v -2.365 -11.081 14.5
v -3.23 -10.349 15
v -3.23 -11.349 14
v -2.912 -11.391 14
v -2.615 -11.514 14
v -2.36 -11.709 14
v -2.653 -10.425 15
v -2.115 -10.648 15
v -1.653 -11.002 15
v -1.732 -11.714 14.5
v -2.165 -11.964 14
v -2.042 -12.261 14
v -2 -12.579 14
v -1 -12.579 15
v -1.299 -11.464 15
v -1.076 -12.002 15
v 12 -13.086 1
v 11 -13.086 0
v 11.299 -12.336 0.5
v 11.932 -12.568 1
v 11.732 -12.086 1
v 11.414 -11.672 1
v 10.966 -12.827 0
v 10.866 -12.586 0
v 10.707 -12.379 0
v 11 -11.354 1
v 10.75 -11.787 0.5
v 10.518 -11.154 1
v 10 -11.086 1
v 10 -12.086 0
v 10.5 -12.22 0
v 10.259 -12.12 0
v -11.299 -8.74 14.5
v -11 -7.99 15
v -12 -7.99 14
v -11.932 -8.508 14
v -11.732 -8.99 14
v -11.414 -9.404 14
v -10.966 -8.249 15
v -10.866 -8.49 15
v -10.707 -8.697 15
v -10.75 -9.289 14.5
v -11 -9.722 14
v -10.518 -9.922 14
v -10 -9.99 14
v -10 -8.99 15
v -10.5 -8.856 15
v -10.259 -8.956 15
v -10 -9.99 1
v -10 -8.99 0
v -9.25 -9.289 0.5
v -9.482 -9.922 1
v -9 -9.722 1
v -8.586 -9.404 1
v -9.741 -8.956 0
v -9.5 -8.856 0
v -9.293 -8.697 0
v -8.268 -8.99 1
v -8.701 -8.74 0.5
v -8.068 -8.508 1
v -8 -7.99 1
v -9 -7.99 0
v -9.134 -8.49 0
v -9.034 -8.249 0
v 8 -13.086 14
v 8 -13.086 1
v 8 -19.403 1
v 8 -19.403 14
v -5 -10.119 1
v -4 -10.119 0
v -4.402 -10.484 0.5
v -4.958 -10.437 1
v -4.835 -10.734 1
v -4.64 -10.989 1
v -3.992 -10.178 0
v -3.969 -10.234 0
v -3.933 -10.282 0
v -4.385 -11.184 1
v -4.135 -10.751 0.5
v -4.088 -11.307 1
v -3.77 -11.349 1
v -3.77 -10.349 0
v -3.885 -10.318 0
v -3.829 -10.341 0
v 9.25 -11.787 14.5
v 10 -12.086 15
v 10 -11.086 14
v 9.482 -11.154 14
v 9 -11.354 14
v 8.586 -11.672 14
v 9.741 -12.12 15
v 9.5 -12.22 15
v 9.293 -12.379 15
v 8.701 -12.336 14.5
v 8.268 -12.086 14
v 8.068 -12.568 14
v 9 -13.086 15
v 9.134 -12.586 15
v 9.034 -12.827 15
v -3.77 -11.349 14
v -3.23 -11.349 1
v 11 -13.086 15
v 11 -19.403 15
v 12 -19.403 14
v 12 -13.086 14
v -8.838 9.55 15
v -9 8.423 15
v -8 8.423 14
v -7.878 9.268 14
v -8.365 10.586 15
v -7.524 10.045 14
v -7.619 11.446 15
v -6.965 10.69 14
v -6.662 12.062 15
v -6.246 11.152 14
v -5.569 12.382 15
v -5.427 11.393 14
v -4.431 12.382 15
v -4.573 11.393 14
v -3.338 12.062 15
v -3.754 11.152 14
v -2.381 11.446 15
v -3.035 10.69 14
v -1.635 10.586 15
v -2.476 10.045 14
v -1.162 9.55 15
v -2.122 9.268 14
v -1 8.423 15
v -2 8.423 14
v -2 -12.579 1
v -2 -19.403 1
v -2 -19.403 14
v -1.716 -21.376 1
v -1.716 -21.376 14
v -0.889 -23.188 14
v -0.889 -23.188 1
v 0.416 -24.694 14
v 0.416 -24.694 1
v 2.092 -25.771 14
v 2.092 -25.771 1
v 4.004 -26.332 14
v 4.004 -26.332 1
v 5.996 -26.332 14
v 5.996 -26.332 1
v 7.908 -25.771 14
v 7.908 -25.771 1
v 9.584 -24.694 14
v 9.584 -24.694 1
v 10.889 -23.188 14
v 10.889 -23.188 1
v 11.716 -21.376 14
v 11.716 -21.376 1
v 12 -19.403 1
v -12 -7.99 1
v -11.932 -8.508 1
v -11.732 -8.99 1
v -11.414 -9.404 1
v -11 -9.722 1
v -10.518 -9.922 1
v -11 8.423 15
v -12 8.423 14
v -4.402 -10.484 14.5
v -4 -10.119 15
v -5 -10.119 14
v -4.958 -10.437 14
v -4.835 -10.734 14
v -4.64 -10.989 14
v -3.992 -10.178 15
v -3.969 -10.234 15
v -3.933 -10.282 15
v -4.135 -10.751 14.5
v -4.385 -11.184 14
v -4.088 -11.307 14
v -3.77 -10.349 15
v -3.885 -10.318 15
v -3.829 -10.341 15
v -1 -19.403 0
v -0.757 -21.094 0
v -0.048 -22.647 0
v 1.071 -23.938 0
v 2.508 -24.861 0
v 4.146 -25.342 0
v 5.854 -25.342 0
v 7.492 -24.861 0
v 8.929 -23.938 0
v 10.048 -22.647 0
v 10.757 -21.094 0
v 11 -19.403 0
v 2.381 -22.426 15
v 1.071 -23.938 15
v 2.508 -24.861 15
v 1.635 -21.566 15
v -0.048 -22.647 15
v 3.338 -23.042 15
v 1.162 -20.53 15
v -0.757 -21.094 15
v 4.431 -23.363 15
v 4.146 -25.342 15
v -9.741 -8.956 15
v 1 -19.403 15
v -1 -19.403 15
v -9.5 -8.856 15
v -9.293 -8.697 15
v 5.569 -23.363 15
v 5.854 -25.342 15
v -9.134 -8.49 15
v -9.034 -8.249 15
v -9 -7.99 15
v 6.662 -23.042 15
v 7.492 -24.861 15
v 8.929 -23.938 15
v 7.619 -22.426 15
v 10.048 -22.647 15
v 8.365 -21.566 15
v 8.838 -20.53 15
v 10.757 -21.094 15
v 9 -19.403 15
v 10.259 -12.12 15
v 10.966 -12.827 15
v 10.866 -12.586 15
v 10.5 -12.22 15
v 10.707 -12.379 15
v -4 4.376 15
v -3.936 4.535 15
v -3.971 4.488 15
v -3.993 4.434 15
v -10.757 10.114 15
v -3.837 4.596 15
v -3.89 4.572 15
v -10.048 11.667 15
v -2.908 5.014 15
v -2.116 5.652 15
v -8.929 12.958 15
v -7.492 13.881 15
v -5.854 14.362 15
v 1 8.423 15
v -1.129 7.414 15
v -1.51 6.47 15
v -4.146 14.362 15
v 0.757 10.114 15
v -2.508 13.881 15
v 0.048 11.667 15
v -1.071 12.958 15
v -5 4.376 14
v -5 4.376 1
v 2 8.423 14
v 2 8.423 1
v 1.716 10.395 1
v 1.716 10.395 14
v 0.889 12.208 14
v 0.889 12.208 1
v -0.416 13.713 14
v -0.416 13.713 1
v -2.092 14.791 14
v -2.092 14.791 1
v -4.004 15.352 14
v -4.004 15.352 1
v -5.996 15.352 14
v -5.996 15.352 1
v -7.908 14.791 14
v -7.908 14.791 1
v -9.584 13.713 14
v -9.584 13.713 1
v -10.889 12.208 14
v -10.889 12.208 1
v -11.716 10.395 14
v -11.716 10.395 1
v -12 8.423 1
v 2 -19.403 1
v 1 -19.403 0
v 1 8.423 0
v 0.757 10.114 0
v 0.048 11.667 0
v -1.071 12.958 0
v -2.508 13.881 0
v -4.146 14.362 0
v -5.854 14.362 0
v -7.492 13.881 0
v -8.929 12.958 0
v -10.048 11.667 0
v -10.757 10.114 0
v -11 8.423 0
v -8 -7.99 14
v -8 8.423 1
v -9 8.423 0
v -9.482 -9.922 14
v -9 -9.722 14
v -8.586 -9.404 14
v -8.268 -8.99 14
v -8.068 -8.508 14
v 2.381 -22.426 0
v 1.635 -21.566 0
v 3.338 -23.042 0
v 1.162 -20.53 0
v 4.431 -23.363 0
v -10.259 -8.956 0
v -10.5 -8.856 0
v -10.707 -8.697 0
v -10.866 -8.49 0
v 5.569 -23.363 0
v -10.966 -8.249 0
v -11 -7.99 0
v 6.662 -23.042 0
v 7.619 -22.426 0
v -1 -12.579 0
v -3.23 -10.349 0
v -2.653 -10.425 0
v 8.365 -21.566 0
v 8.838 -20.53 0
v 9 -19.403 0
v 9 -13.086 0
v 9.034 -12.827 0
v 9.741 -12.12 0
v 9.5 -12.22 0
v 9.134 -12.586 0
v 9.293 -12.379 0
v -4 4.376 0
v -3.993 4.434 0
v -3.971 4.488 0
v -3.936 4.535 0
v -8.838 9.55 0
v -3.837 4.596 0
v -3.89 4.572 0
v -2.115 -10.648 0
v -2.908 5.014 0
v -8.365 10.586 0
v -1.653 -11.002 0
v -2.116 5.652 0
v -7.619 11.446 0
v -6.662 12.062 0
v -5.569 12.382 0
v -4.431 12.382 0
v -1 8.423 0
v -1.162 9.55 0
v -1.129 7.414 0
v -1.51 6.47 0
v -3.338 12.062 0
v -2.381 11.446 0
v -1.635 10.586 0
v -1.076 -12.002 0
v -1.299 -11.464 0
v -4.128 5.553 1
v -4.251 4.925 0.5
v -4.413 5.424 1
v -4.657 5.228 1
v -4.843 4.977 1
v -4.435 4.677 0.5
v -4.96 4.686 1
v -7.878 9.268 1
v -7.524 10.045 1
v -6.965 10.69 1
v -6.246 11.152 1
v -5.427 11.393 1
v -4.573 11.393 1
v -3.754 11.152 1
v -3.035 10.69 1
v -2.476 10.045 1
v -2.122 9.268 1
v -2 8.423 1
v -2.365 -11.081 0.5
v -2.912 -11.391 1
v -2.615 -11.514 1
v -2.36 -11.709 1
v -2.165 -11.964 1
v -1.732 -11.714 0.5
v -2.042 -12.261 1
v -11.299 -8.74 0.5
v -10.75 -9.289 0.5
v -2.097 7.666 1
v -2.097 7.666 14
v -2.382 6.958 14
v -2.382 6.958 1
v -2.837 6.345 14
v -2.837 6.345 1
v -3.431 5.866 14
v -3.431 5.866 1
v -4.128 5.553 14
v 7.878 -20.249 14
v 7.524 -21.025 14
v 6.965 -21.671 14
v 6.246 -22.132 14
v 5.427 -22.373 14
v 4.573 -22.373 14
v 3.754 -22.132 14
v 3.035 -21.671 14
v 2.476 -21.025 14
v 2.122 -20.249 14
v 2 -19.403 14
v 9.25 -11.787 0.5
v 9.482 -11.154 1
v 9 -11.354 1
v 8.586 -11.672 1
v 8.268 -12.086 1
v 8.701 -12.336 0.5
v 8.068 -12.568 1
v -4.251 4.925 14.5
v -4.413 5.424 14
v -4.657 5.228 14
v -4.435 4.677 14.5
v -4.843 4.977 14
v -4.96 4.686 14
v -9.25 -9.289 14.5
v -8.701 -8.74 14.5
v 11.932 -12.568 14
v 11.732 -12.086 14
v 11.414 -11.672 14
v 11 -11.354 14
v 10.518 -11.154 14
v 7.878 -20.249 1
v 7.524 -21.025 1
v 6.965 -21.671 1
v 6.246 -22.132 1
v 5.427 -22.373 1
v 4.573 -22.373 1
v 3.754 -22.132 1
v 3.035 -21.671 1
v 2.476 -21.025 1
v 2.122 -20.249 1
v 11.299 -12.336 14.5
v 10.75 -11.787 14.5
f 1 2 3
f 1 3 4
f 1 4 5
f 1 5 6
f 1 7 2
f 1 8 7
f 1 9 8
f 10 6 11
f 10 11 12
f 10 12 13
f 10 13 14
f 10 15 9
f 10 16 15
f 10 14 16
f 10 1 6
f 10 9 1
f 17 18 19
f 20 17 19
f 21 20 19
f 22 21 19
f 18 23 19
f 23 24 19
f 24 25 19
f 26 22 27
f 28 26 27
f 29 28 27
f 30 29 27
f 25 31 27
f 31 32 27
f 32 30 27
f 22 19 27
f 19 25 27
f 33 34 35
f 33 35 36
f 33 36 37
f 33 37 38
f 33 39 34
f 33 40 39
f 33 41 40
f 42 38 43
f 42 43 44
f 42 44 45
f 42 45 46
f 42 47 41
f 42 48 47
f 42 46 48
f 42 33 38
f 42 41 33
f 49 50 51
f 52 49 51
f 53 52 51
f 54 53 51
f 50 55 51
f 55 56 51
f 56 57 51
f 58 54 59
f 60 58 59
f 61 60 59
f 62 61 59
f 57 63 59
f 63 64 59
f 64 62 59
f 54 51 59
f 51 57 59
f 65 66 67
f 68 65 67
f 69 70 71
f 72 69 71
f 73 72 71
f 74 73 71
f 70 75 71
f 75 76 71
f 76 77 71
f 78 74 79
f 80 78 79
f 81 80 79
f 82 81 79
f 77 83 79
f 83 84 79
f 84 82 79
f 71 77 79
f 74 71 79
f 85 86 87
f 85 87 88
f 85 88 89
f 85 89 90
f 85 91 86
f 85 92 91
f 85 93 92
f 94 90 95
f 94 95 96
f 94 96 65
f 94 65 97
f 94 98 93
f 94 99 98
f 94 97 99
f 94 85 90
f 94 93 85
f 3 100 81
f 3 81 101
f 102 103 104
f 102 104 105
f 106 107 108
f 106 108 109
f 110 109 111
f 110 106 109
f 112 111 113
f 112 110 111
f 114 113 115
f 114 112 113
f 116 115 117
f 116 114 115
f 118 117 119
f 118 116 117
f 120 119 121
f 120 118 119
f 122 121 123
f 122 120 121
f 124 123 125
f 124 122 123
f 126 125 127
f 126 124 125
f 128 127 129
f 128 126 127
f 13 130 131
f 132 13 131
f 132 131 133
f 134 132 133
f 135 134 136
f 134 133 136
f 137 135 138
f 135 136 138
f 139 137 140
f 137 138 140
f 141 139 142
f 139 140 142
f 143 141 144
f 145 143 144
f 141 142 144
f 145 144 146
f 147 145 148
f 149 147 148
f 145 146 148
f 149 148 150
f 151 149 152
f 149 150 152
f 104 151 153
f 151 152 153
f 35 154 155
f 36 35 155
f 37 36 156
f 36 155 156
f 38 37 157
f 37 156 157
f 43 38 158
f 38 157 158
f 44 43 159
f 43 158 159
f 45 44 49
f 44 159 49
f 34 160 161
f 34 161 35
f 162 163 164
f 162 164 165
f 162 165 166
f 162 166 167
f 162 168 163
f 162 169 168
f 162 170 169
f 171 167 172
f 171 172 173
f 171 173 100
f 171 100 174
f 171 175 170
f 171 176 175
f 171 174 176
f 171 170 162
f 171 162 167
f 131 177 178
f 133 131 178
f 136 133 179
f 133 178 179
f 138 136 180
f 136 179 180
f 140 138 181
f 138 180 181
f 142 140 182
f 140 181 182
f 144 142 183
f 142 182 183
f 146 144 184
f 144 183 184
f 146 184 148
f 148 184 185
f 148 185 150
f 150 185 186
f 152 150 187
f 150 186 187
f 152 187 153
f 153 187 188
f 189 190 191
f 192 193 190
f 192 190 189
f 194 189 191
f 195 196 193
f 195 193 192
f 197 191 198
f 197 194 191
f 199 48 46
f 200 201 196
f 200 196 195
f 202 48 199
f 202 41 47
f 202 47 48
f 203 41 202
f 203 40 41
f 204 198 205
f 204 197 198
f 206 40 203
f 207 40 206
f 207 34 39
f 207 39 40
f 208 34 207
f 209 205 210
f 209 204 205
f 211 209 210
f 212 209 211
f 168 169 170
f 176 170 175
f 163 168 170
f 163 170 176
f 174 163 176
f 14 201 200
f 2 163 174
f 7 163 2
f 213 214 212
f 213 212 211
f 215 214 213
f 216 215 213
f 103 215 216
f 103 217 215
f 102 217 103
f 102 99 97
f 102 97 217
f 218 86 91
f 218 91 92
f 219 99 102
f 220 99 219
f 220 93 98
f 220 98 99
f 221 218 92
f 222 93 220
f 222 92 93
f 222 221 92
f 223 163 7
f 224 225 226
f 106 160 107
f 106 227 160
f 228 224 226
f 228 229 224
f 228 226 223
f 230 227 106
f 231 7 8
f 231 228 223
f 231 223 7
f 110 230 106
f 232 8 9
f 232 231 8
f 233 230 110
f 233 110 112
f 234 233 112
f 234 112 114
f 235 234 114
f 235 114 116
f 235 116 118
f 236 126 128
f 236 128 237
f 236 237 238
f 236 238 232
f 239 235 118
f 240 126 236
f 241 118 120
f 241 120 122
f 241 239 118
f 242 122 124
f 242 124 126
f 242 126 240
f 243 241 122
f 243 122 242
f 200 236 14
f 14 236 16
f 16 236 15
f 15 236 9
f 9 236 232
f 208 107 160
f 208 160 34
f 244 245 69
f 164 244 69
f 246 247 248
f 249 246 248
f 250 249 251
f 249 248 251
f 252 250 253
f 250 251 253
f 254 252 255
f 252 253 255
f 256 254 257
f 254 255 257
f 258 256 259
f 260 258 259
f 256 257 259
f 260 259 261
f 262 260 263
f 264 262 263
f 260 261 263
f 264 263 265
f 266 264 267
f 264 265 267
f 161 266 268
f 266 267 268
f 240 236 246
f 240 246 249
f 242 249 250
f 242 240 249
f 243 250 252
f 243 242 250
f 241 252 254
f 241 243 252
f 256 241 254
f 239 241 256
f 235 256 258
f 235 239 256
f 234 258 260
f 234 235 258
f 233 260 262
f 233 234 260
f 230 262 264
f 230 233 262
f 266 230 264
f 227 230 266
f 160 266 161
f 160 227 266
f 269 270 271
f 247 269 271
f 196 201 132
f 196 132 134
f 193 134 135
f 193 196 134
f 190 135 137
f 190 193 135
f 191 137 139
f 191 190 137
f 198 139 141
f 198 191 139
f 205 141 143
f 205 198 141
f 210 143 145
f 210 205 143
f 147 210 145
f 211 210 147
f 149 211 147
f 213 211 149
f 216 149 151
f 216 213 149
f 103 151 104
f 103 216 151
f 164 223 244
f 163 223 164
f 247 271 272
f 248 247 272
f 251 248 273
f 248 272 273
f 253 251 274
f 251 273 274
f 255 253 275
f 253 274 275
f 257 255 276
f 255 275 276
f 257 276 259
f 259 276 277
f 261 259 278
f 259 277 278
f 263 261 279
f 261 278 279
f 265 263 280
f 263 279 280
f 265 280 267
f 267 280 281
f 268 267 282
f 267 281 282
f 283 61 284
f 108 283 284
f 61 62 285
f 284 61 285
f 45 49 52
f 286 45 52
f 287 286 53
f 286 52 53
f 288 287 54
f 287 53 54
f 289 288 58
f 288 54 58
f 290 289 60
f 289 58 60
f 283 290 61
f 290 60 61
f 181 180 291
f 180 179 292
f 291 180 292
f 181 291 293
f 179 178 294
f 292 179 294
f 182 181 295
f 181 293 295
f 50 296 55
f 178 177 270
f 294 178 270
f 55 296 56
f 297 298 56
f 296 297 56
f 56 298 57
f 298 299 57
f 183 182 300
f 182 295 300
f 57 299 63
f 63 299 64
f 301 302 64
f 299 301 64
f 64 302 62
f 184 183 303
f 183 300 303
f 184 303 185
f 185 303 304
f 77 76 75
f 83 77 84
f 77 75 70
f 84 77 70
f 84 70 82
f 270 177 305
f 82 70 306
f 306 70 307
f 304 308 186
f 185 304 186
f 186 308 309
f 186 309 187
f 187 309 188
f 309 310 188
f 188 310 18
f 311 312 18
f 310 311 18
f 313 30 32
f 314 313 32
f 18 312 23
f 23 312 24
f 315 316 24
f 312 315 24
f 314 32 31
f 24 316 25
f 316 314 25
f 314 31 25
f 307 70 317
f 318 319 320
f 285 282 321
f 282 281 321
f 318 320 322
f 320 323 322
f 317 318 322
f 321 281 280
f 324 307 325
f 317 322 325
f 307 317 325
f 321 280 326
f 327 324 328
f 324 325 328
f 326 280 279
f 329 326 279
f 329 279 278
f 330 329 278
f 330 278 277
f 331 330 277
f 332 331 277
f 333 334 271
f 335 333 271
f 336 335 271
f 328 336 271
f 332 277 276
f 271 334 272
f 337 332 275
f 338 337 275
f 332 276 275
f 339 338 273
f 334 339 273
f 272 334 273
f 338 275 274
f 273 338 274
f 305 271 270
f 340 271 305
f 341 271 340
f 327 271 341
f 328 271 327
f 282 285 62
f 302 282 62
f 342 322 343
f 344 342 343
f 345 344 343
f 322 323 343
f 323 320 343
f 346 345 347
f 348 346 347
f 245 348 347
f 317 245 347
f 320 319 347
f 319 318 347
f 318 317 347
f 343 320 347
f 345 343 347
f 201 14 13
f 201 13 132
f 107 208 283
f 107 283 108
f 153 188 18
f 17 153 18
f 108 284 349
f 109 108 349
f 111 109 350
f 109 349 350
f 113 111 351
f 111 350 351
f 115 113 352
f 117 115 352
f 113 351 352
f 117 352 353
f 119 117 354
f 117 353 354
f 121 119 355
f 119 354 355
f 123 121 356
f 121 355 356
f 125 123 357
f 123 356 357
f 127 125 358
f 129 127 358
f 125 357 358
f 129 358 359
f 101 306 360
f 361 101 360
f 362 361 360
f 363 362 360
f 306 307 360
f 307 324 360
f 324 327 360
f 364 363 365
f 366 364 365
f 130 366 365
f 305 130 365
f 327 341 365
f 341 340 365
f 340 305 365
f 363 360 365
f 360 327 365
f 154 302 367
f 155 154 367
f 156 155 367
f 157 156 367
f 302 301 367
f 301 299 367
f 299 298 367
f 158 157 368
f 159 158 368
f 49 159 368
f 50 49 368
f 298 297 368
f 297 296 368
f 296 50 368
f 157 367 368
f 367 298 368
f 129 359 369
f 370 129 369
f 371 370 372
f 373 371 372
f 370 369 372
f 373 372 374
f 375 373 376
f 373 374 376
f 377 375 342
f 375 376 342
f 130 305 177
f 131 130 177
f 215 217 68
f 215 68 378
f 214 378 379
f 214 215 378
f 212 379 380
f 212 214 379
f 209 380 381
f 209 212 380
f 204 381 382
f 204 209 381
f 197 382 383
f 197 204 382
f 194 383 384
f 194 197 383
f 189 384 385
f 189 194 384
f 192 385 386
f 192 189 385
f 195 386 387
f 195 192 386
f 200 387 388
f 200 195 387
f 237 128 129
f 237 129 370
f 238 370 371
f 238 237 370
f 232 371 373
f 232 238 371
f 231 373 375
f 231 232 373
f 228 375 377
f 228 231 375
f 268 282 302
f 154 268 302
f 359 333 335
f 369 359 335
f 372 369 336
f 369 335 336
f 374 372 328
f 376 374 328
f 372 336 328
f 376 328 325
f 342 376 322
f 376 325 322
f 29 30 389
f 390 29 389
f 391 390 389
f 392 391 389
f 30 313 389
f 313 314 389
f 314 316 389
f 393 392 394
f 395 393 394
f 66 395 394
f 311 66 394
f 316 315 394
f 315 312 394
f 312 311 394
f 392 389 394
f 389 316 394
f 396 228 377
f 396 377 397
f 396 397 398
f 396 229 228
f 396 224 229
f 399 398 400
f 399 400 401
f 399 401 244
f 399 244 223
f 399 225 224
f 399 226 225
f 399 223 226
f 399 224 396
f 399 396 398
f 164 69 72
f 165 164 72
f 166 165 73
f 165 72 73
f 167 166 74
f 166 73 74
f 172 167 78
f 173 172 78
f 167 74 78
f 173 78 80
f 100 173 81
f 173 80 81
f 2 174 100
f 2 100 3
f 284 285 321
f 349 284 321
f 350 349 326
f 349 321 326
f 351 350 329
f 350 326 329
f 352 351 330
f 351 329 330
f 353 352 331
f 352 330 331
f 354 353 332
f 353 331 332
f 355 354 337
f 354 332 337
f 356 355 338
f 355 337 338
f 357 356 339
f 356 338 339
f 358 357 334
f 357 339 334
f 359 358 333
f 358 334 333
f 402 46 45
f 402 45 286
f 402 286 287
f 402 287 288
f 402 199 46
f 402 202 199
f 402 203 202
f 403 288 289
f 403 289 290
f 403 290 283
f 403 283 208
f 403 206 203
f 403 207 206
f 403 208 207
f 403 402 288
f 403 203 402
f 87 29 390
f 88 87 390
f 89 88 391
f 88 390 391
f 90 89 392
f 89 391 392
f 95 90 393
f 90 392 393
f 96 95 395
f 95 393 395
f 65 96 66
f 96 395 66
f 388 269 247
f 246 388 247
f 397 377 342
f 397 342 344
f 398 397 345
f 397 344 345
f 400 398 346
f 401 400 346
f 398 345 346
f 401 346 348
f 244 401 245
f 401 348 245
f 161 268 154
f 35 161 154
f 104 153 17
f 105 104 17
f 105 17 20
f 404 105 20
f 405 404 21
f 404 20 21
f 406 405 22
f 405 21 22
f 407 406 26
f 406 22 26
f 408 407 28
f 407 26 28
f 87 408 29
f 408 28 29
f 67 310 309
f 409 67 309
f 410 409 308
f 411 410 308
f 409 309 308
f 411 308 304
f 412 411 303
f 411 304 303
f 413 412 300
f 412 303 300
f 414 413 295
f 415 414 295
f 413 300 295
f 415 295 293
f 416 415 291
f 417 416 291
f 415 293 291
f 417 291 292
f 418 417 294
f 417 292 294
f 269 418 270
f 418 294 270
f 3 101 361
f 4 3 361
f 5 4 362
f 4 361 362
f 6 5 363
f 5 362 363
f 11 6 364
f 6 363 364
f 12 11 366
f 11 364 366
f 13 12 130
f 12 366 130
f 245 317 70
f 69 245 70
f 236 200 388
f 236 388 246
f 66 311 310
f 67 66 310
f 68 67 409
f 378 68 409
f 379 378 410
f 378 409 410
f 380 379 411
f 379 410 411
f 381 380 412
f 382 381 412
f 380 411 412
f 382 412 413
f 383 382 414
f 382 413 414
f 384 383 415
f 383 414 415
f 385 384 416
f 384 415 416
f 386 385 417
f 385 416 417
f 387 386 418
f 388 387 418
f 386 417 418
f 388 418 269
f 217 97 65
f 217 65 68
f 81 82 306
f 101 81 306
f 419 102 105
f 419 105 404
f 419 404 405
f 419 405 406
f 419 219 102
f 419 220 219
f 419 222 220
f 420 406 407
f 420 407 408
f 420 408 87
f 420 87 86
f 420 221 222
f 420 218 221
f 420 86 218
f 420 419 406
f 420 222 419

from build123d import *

# Parameters (mm, degrees)
F1_DEPTH = 15
F2_SIZE  = 1


with BuildPart() as f1:
    # F0 (on Top) → F1 (new body)
    with BuildSketch(Plane.XY):
        with BuildLine():
            ThreePointArc((-8, 8.423196), (-8.585786, 7.008983), (-10, 6.423196))
            Line((-10, 6.423196), (-10, -7.990119))
            Line((-10, -7.990119), (-10, -9.990119))
            ThreePointArc((-10, -9.990119), (-8.585786, -9.404332), (-8, -7.990119))
            Line((-8, -7.990119), (-8, 8.423196))
        make_face()
        with BuildLine():
            Line((-10, -7.990119), (-10, 6.423196))
            ThreePointArc((-10, 6.423196), (-11.414214, 7.008983), (-12, 8.423196))
            Line((-12, 8.423196), (-12, -7.990119))
            ThreePointArc((-12, -7.990119), (-11.414214, -9.404332), (-10, -9.990119))
            Line((-10, -9.990119), (-10, -7.990119))
        make_face()
        with BuildLine():
            Line((-10, 6.423196), (-10, 8.423196))
            ThreePointArc((-10, 8.423196), (-9.898979, 9.423196), (-9.6, 10.382788))
            ThreePointArc((-9.6, 10.382788), (-11.264911, 9.97239), (-12, 8.423196))
            ThreePointArc((-12, 8.423196), (-11.414214, 7.008983), (-10, 6.423196))
        make_face()
        with BuildLine():
            ThreePointArc((-9.6, 10.382788), (-9.898979, 9.423196), (-10, 8.423196))
            Line((-10, 8.423196), (-10, 6.423196))
            ThreePointArc((-10, 6.423196), (-8.585786, 7.008983), (-8, 8.423196))
            ThreePointArc((-8, 8.423196), (-8.450807, 9.688108), (-9.6, 10.382788))
        make_face()
        with BuildLine():
            ThreePointArc((-0.4, 10.382788), (-5, 13.423196), (-9.6, 10.382788))
            ThreePointArc((-9.6, 10.382788), (-8.450807, 9.688108), (-8, 8.423196))
            ThreePointArc((-8, 8.423196), (-5, 11.423196), (-2, 8.423196))
            ThreePointArc((-2, 8.423196), (-1.549193, 9.688108), (-0.4, 10.382788))
        make_face()
        with BuildLine():
            ThreePointArc((-12, 8.423196), (-11.264911, 9.97239), (-9.6, 10.382788))
            ThreePointArc((-9.6, 10.382788), (-5, 13.423196), (-0.4, 10.382788))
            ThreePointArc((-0.4, 10.382788), (1.264911, 9.97239), (2, 8.423196))
            ThreePointArc((2, 8.423196), (-5, 15.423196), (-12, 8.423196))
        make_face()
        with BuildLine():
            ThreePointArc((2, 8.423196), (1.264911, 9.97239), (-0.4, 10.382788))
            ThreePointArc((-0.4, 10.382788), (-0.101021, 9.423196), (0, 8.423196))
            Line((0, 8.423196), (0, 6.423196))
            ThreePointArc((0, 6.423196), (1.414214, 7.008983), (2, 8.423196))
        make_face()
        with BuildLine():
            ThreePointArc((0, 8.423196), (-0.101021, 9.423196), (-0.4, 10.382788))
            ThreePointArc((-0.4, 10.382788), (-1.549193, 9.688108), (-2, 8.423196))
            ThreePointArc((-2, 8.423196), (-1.414214, 7.008983), (0, 6.423196))
            Line((0, 6.423196), (0, 8.423196))
        make_face()
        with BuildLine():
            ThreePointArc((0, 6.423196), (-1.414214, 7.008983), (-2, 8.423196))
            ThreePointArc((-2, 8.423196), (-2.589872, 6.63678), (-4.127523, 5.552868))
            ThreePointArc((-4.127523, 5.552868), (-4.758099, 5.108366), (-5, 4.375774))
            Line((-5, 4.375774), (-5, -10.118682))
            ThreePointArc((-5, -10.118682), (-4.639662, -10.988615), (-3.769728, -11.348953))
            Line((-3.769728, -11.348953), (-3.230272, -11.348953))
            ThreePointArc((-3.230272, -11.348953), (-2.360338, -11.709292), (-2, -12.579225))
            Line((-2, -12.579225), (-2, -19.403434))
            ThreePointArc((-2, -19.403434), (-1.414214, -17.98922), (0, -17.403434))
            Line((0, -17.403434), (0, 6.423196))
        make_face()
        with BuildLine():
            Line((2, -19.403434), (2, 8.423196))
            ThreePointArc((2, 8.423196), (1.414214, 7.008983), (0, 6.423196))
            Line((0, 6.423196), (0, -17.403434))
            ThreePointArc((0, -17.403434), (1.414214, -17.98922), (2, -19.403434))
        make_face()
        with BuildLine():
            ThreePointArc((0.4, -21.363025), (1.549193, -20.668345), (2, -19.403434))
            ThreePointArc((2, -19.403434), (1.414214, -17.98922), (0, -17.403434))
            Line((0, -17.403434), (0, -19.403434))
            ThreePointArc((0, -19.403434), (0.101021, -20.403434), (0.4, -21.363025))
        make_face()
        with BuildLine():
            Line((0, -19.403434), (0, -17.403434))
            ThreePointArc((0, -17.403434), (-1.414214, -17.98922), (-2, -19.403434))
            ThreePointArc((-2, -19.403434), (-1.264911, -20.952627), (0.4, -21.363025))
            ThreePointArc((0.4, -21.363025), (0.101021, -20.403434), (0, -19.403434))
        make_face()
        with BuildLine():
            ThreePointArc((9.6, -21.363025), (5, -24.403434), (0.4, -21.363025))
            ThreePointArc((0.4, -21.363025), (-1.264911, -20.952627), (-2, -19.403434))
            ThreePointArc((-2, -19.403434), (5, -26.403434), (12, -19.403434))
            ThreePointArc((12, -19.403434), (11.264911, -20.952627), (9.6, -21.363025))
        make_face()
        with BuildLine():
            ThreePointArc((8, -19.403434), (5, -22.403434), (2, -19.403434))
            ThreePointArc((2, -19.403434), (1.549193, -20.668345), (0.4, -21.363025))
            ThreePointArc((0.4, -21.363025), (5, -24.403434), (9.6, -21.363025))
            ThreePointArc((9.6, -21.363025), (8.450807, -20.668345), (8, -19.403434))
        make_face()
        with BuildLine():
            ThreePointArc((10, -17.403434), (8.585786, -17.98922), (8, -19.403434))
            ThreePointArc((8, -19.403434), (8.450807, -20.668345), (9.6, -21.363025))
            ThreePointArc((9.6, -21.363025), (9.898979, -20.403434), (10, -19.403434))
            Line((10, -19.403434), (10, -17.403434))
        make_face()
        with BuildLine():
            ThreePointArc((10, -19.403434), (9.898979, -20.403434), (9.6, -21.363025))
            ThreePointArc((9.6, -21.363025), (11.264911, -20.952627), (12, -19.403434))
            ThreePointArc((12, -19.403434), (11.414214, -17.98922), (10, -17.403434))
            Line((10, -17.403434), (10, -19.403434))
        make_face()
        with BuildLine():
            Line((10, -13.086037), (10, -17.403434))
            ThreePointArc((10, -17.403434), (11.414214, -17.98922), (12, -19.403434))
            Line((12, -19.403434), (12, -13.086037))
            ThreePointArc((12, -13.086037), (11.414214, -11.671824), (10, -11.086037))
            Line((10, -11.086037), (10, -13.086037))
        make_face()
        with BuildLine():
            Line((8, -13.086037), (8, -19.403434))
            ThreePointArc((8, -19.403434), (8.585786, -17.98922), (10, -17.403434))
            Line((10, -17.403434), (10, -13.086037))
            Line((10, -13.086037), (10, -11.086037))
            ThreePointArc((10, -11.086037), (8.585786, -11.671824), (8, -13.086037))
        make_face()
    extrude(amount=F1_DEPTH)

    # F2
    f2_edges = [f1.edges().sort_by_distance(p)[0] for p in [
        (-5, 15.423196, 15),
        (-12, 0.216539, 15),
        (-10, -9.990119, 15),
        (-8, 0.216539, 15),
        (-3.213583, 10.833324, 15),
        (-4.758099, 5.108366, 15),
        (-5, -2.871454, 15),
        (-4.639662, -10.988615, 15),
        (-3.5, -11.348953, 15),
        (-2.360338, -11.709292, 15),
        (-2, -15.991329, 15),
        (5, -26.403434, 15),
        (12, -16.244735, 15),
        (10, -11.086037, 15),
        (8, -16.244735, 15),
        (5, -22.403434, 15),
        (2, -5.490119, 15),
        (-5, 15.423196, 0),
        (-12, 0.216539, 0),
        (-10, -9.990119, 0),
        (-8, 0.216539, 0),
        (-3.213583, 10.833324, 0),
        (-4.758099, 5.108366, 0),
        (-5, -2.871454, 0),
        (-4.639662, -10.988615, 0),
        (-3.5, -11.348953, 0),
        (-2.360338, -11.709292, 0),
        (-2, -15.991329, 0),
        (5, -26.403434, 0),
        (12, -16.244735, 0),
        (10, -11.086037, 0),
        (8, -16.244735, 0),
        (5, -22.403434, 0),
        (2, -5.490119, 0),
    ]]
    chamfer(f2_edges, length=F2_SIZE)


solid = f1.part
